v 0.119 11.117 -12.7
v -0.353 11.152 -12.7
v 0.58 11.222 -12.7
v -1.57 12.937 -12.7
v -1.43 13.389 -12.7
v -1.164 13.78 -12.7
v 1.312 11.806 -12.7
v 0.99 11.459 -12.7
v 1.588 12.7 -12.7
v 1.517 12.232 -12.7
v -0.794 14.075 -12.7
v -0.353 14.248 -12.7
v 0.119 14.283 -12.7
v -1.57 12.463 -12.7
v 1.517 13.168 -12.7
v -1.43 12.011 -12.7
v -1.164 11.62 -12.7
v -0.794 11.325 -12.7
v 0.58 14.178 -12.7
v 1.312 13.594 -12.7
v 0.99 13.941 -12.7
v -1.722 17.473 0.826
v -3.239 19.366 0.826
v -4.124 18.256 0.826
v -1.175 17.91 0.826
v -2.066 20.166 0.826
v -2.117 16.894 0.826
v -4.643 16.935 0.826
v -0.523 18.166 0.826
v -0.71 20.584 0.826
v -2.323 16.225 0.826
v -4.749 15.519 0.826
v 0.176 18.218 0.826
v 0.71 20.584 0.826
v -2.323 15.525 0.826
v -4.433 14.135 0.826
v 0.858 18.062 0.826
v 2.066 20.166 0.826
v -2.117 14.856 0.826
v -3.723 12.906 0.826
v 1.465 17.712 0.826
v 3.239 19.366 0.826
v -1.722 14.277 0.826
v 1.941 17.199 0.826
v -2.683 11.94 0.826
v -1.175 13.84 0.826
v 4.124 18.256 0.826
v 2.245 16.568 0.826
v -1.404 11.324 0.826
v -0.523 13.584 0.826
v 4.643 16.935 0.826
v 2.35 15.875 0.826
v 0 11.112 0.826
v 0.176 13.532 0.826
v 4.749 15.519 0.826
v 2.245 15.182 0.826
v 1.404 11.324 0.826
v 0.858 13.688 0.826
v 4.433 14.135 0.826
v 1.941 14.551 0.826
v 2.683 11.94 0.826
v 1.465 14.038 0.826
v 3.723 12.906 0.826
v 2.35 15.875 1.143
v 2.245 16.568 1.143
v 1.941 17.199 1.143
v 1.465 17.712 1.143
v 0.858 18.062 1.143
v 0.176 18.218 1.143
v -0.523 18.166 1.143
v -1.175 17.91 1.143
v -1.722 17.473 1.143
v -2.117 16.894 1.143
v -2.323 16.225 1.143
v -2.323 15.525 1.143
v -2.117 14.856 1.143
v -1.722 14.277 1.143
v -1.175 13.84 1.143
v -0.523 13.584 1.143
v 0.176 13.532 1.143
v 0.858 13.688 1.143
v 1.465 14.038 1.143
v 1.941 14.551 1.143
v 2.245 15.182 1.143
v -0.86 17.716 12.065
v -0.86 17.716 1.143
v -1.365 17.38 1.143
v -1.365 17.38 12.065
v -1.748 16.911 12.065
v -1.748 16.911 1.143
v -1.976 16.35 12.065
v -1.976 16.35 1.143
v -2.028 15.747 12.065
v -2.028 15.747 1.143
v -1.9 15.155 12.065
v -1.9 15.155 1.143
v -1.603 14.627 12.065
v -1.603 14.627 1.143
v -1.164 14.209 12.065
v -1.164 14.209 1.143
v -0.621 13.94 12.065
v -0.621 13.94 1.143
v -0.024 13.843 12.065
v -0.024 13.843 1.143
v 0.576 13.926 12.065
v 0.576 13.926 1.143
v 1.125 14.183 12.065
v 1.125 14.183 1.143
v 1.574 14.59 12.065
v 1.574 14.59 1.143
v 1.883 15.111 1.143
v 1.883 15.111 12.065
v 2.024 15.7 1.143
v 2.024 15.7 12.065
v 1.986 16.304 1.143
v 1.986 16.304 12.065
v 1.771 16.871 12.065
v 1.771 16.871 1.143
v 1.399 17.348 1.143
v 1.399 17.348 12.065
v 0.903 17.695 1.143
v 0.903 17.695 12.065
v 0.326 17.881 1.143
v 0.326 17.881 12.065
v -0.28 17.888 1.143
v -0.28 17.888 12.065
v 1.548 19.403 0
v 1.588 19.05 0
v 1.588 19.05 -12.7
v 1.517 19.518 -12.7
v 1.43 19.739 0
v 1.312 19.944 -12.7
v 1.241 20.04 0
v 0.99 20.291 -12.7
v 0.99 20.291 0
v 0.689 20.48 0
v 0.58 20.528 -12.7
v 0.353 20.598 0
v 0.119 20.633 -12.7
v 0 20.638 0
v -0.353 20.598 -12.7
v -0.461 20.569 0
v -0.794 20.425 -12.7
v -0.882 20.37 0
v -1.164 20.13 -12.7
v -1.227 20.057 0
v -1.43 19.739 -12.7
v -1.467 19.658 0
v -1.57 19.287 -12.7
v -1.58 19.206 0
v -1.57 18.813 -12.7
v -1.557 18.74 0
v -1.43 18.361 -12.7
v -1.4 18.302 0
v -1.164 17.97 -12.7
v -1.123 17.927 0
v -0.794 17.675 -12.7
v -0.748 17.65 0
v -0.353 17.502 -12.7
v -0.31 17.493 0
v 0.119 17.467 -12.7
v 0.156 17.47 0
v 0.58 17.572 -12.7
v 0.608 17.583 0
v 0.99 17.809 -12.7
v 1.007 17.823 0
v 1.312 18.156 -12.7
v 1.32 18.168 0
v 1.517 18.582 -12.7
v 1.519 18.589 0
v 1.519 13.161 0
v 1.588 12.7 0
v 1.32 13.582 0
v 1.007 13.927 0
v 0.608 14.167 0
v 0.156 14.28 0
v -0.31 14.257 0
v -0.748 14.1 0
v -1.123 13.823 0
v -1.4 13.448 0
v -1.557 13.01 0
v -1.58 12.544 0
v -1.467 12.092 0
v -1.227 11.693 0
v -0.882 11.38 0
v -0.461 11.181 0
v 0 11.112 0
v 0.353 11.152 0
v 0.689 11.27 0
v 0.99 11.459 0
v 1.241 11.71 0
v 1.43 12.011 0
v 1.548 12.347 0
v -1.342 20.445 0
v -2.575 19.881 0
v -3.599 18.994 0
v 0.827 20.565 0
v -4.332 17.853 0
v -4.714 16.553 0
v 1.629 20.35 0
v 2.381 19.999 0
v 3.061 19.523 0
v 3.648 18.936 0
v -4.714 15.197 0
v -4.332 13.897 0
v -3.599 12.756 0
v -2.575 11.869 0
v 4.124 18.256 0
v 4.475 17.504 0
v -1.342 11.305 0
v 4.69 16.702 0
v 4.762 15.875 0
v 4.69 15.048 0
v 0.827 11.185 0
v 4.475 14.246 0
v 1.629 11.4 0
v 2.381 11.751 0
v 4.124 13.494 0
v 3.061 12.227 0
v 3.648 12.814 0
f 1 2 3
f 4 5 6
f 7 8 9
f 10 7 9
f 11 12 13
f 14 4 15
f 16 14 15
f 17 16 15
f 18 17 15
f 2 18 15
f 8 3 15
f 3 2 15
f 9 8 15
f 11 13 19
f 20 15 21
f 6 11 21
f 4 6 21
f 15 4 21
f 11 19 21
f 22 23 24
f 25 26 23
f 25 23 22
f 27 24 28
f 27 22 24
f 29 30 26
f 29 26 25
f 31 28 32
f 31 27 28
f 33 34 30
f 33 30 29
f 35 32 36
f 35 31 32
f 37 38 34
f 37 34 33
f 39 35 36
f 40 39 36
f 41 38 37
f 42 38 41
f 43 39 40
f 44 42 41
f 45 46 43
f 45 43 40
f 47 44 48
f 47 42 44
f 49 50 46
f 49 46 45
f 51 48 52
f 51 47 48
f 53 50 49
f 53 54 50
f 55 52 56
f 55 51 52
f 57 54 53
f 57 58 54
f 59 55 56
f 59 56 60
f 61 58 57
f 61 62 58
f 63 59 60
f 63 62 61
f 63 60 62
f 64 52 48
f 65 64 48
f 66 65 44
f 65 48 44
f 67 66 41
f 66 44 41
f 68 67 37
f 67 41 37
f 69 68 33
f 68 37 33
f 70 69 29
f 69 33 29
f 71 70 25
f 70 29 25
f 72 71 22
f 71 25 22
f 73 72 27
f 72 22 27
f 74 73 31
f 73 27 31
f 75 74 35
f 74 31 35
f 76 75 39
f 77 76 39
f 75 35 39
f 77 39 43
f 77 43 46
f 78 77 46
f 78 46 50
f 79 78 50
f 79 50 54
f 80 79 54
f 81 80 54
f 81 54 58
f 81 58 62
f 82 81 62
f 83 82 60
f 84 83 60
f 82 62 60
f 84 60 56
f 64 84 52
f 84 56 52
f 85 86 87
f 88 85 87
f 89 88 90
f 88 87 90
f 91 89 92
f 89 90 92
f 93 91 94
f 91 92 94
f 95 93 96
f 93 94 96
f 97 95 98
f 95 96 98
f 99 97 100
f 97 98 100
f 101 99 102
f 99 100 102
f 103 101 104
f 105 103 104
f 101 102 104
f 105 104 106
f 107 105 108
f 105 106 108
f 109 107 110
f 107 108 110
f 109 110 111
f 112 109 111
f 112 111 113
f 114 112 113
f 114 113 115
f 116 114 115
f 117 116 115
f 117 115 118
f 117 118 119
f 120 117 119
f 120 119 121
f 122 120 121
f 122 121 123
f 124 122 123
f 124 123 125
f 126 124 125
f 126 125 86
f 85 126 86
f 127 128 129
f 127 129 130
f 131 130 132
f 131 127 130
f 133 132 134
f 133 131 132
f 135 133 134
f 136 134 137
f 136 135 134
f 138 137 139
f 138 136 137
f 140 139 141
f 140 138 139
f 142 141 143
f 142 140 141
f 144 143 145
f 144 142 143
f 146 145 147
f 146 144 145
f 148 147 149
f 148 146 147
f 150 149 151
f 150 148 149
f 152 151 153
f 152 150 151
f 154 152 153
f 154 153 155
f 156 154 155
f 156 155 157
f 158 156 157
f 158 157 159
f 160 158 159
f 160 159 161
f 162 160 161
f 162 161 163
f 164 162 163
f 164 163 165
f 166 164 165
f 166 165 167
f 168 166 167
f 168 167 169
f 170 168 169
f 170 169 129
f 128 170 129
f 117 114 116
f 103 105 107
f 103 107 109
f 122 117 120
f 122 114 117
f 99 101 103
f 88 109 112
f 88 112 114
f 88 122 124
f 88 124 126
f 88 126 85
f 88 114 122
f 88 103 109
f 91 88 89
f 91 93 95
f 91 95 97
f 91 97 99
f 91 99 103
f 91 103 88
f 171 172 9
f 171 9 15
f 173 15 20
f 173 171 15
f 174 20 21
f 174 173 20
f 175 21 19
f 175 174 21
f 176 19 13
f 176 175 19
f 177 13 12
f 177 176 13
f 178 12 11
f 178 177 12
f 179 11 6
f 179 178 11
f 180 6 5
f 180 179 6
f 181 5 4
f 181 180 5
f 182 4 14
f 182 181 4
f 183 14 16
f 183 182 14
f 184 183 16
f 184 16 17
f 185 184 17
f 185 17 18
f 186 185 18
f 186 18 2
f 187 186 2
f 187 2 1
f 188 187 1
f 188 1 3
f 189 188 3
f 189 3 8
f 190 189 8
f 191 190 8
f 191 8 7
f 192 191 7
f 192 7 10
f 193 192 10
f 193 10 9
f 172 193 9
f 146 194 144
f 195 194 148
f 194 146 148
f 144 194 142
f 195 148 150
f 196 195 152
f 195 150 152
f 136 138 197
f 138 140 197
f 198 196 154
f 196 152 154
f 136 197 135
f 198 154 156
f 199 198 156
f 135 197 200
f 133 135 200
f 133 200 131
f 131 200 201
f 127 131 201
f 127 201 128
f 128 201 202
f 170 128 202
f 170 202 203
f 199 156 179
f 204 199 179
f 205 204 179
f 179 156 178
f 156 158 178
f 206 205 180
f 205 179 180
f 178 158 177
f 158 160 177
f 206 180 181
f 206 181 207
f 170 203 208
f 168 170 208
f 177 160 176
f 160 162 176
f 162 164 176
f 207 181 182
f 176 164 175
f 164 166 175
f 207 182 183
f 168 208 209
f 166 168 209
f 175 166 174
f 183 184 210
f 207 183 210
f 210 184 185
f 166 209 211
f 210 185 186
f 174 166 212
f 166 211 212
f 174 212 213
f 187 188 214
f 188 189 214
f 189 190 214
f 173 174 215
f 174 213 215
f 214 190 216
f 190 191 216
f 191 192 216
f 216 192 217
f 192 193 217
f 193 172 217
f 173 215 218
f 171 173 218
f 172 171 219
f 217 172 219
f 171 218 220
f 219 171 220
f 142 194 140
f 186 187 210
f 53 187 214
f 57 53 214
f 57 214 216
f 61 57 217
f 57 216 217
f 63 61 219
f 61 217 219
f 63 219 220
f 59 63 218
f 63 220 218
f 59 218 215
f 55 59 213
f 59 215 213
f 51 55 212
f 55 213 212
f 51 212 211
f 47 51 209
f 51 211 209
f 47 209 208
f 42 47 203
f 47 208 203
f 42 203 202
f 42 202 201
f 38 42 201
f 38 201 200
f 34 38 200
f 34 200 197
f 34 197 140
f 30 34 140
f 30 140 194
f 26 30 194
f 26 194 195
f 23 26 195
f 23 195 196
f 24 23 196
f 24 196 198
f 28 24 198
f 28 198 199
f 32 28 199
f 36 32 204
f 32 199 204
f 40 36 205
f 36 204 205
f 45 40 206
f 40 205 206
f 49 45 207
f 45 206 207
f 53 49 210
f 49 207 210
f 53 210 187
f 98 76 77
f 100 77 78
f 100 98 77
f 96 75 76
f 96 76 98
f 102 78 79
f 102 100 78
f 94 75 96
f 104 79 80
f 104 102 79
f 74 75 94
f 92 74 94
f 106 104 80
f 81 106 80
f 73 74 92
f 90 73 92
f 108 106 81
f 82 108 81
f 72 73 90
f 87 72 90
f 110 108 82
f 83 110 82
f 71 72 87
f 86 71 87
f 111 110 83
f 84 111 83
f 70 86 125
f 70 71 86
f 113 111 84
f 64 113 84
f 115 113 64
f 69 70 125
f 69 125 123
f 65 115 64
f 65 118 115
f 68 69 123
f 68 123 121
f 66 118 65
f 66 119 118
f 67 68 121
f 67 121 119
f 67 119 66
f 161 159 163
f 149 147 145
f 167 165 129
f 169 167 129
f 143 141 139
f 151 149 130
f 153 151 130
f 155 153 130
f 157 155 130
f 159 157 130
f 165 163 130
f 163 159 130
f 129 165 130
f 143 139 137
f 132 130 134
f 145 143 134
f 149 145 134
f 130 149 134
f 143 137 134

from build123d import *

# Parameters (mm, degrees)
SKETCH1_R             = 1.5875
BOSS_EXTRUDE1_DEPTH   = 12.7
BOSS_EXTRUDE1_2_DEPTH = 12.7
SKETCH2_R             = 2.032
BOSS_EXTRUDE2_DEPTH   = 12.065
SKETCH3_R             = 4.7625
BOSS_EXTRUDE3_DEPTH   = 0.8255
SKETCH4_R             = 2.3495
BOSS_EXTRUDE4_DEPTH   = 0.3175


with BuildPart() as part:
    # Sketch1 → Boss-Extrude1 (new body)
    with BuildSketch(Plane.XY):
        with Locations((0, 12.7)):
            Circle(SKETCH1_R)
    extrude(amount=-BOSS_EXTRUDE1_DEPTH)



with BuildPart() as body_2:
    # Sketch1 → Boss-Extrude1 2 (new body)
    with BuildSketch(Plane.XY):
        with Locations((0, 19.05)):
            Circle(SKETCH1_R)
    extrude(amount=-BOSS_EXTRUDE1_2_DEPTH)


with BuildPart() as part_1:
    add(part.part)

    add(body_2.part)  # Boss-Extrude2 merges body 2
    # Sketch2 → Boss-Extrude2 (add)
    with BuildSketch(Plane.XY):
        with Locations((0, 15.875)):
            Circle(SKETCH2_R)
    extrude(amount=BOSS_EXTRUDE2_DEPTH)

    # Sketch3 → Boss-Extrude3 (add)
    with BuildSketch(Plane.XY):
        with Locations((0, 15.875)):
            Circle(SKETCH3_R)
    extrude(amount=BOSS_EXTRUDE3_DEPTH)

    # Sketch4 → Boss-Extrude4 (add)
    with BuildSketch(Plane.XY.offset(0.8255)):
        with Locations((0, 15.875)):
            Circle(SKETCH4_R)
    extrude(amount=BOSS_EXTRUDE4_DEPTH)


solid = part_1.part
